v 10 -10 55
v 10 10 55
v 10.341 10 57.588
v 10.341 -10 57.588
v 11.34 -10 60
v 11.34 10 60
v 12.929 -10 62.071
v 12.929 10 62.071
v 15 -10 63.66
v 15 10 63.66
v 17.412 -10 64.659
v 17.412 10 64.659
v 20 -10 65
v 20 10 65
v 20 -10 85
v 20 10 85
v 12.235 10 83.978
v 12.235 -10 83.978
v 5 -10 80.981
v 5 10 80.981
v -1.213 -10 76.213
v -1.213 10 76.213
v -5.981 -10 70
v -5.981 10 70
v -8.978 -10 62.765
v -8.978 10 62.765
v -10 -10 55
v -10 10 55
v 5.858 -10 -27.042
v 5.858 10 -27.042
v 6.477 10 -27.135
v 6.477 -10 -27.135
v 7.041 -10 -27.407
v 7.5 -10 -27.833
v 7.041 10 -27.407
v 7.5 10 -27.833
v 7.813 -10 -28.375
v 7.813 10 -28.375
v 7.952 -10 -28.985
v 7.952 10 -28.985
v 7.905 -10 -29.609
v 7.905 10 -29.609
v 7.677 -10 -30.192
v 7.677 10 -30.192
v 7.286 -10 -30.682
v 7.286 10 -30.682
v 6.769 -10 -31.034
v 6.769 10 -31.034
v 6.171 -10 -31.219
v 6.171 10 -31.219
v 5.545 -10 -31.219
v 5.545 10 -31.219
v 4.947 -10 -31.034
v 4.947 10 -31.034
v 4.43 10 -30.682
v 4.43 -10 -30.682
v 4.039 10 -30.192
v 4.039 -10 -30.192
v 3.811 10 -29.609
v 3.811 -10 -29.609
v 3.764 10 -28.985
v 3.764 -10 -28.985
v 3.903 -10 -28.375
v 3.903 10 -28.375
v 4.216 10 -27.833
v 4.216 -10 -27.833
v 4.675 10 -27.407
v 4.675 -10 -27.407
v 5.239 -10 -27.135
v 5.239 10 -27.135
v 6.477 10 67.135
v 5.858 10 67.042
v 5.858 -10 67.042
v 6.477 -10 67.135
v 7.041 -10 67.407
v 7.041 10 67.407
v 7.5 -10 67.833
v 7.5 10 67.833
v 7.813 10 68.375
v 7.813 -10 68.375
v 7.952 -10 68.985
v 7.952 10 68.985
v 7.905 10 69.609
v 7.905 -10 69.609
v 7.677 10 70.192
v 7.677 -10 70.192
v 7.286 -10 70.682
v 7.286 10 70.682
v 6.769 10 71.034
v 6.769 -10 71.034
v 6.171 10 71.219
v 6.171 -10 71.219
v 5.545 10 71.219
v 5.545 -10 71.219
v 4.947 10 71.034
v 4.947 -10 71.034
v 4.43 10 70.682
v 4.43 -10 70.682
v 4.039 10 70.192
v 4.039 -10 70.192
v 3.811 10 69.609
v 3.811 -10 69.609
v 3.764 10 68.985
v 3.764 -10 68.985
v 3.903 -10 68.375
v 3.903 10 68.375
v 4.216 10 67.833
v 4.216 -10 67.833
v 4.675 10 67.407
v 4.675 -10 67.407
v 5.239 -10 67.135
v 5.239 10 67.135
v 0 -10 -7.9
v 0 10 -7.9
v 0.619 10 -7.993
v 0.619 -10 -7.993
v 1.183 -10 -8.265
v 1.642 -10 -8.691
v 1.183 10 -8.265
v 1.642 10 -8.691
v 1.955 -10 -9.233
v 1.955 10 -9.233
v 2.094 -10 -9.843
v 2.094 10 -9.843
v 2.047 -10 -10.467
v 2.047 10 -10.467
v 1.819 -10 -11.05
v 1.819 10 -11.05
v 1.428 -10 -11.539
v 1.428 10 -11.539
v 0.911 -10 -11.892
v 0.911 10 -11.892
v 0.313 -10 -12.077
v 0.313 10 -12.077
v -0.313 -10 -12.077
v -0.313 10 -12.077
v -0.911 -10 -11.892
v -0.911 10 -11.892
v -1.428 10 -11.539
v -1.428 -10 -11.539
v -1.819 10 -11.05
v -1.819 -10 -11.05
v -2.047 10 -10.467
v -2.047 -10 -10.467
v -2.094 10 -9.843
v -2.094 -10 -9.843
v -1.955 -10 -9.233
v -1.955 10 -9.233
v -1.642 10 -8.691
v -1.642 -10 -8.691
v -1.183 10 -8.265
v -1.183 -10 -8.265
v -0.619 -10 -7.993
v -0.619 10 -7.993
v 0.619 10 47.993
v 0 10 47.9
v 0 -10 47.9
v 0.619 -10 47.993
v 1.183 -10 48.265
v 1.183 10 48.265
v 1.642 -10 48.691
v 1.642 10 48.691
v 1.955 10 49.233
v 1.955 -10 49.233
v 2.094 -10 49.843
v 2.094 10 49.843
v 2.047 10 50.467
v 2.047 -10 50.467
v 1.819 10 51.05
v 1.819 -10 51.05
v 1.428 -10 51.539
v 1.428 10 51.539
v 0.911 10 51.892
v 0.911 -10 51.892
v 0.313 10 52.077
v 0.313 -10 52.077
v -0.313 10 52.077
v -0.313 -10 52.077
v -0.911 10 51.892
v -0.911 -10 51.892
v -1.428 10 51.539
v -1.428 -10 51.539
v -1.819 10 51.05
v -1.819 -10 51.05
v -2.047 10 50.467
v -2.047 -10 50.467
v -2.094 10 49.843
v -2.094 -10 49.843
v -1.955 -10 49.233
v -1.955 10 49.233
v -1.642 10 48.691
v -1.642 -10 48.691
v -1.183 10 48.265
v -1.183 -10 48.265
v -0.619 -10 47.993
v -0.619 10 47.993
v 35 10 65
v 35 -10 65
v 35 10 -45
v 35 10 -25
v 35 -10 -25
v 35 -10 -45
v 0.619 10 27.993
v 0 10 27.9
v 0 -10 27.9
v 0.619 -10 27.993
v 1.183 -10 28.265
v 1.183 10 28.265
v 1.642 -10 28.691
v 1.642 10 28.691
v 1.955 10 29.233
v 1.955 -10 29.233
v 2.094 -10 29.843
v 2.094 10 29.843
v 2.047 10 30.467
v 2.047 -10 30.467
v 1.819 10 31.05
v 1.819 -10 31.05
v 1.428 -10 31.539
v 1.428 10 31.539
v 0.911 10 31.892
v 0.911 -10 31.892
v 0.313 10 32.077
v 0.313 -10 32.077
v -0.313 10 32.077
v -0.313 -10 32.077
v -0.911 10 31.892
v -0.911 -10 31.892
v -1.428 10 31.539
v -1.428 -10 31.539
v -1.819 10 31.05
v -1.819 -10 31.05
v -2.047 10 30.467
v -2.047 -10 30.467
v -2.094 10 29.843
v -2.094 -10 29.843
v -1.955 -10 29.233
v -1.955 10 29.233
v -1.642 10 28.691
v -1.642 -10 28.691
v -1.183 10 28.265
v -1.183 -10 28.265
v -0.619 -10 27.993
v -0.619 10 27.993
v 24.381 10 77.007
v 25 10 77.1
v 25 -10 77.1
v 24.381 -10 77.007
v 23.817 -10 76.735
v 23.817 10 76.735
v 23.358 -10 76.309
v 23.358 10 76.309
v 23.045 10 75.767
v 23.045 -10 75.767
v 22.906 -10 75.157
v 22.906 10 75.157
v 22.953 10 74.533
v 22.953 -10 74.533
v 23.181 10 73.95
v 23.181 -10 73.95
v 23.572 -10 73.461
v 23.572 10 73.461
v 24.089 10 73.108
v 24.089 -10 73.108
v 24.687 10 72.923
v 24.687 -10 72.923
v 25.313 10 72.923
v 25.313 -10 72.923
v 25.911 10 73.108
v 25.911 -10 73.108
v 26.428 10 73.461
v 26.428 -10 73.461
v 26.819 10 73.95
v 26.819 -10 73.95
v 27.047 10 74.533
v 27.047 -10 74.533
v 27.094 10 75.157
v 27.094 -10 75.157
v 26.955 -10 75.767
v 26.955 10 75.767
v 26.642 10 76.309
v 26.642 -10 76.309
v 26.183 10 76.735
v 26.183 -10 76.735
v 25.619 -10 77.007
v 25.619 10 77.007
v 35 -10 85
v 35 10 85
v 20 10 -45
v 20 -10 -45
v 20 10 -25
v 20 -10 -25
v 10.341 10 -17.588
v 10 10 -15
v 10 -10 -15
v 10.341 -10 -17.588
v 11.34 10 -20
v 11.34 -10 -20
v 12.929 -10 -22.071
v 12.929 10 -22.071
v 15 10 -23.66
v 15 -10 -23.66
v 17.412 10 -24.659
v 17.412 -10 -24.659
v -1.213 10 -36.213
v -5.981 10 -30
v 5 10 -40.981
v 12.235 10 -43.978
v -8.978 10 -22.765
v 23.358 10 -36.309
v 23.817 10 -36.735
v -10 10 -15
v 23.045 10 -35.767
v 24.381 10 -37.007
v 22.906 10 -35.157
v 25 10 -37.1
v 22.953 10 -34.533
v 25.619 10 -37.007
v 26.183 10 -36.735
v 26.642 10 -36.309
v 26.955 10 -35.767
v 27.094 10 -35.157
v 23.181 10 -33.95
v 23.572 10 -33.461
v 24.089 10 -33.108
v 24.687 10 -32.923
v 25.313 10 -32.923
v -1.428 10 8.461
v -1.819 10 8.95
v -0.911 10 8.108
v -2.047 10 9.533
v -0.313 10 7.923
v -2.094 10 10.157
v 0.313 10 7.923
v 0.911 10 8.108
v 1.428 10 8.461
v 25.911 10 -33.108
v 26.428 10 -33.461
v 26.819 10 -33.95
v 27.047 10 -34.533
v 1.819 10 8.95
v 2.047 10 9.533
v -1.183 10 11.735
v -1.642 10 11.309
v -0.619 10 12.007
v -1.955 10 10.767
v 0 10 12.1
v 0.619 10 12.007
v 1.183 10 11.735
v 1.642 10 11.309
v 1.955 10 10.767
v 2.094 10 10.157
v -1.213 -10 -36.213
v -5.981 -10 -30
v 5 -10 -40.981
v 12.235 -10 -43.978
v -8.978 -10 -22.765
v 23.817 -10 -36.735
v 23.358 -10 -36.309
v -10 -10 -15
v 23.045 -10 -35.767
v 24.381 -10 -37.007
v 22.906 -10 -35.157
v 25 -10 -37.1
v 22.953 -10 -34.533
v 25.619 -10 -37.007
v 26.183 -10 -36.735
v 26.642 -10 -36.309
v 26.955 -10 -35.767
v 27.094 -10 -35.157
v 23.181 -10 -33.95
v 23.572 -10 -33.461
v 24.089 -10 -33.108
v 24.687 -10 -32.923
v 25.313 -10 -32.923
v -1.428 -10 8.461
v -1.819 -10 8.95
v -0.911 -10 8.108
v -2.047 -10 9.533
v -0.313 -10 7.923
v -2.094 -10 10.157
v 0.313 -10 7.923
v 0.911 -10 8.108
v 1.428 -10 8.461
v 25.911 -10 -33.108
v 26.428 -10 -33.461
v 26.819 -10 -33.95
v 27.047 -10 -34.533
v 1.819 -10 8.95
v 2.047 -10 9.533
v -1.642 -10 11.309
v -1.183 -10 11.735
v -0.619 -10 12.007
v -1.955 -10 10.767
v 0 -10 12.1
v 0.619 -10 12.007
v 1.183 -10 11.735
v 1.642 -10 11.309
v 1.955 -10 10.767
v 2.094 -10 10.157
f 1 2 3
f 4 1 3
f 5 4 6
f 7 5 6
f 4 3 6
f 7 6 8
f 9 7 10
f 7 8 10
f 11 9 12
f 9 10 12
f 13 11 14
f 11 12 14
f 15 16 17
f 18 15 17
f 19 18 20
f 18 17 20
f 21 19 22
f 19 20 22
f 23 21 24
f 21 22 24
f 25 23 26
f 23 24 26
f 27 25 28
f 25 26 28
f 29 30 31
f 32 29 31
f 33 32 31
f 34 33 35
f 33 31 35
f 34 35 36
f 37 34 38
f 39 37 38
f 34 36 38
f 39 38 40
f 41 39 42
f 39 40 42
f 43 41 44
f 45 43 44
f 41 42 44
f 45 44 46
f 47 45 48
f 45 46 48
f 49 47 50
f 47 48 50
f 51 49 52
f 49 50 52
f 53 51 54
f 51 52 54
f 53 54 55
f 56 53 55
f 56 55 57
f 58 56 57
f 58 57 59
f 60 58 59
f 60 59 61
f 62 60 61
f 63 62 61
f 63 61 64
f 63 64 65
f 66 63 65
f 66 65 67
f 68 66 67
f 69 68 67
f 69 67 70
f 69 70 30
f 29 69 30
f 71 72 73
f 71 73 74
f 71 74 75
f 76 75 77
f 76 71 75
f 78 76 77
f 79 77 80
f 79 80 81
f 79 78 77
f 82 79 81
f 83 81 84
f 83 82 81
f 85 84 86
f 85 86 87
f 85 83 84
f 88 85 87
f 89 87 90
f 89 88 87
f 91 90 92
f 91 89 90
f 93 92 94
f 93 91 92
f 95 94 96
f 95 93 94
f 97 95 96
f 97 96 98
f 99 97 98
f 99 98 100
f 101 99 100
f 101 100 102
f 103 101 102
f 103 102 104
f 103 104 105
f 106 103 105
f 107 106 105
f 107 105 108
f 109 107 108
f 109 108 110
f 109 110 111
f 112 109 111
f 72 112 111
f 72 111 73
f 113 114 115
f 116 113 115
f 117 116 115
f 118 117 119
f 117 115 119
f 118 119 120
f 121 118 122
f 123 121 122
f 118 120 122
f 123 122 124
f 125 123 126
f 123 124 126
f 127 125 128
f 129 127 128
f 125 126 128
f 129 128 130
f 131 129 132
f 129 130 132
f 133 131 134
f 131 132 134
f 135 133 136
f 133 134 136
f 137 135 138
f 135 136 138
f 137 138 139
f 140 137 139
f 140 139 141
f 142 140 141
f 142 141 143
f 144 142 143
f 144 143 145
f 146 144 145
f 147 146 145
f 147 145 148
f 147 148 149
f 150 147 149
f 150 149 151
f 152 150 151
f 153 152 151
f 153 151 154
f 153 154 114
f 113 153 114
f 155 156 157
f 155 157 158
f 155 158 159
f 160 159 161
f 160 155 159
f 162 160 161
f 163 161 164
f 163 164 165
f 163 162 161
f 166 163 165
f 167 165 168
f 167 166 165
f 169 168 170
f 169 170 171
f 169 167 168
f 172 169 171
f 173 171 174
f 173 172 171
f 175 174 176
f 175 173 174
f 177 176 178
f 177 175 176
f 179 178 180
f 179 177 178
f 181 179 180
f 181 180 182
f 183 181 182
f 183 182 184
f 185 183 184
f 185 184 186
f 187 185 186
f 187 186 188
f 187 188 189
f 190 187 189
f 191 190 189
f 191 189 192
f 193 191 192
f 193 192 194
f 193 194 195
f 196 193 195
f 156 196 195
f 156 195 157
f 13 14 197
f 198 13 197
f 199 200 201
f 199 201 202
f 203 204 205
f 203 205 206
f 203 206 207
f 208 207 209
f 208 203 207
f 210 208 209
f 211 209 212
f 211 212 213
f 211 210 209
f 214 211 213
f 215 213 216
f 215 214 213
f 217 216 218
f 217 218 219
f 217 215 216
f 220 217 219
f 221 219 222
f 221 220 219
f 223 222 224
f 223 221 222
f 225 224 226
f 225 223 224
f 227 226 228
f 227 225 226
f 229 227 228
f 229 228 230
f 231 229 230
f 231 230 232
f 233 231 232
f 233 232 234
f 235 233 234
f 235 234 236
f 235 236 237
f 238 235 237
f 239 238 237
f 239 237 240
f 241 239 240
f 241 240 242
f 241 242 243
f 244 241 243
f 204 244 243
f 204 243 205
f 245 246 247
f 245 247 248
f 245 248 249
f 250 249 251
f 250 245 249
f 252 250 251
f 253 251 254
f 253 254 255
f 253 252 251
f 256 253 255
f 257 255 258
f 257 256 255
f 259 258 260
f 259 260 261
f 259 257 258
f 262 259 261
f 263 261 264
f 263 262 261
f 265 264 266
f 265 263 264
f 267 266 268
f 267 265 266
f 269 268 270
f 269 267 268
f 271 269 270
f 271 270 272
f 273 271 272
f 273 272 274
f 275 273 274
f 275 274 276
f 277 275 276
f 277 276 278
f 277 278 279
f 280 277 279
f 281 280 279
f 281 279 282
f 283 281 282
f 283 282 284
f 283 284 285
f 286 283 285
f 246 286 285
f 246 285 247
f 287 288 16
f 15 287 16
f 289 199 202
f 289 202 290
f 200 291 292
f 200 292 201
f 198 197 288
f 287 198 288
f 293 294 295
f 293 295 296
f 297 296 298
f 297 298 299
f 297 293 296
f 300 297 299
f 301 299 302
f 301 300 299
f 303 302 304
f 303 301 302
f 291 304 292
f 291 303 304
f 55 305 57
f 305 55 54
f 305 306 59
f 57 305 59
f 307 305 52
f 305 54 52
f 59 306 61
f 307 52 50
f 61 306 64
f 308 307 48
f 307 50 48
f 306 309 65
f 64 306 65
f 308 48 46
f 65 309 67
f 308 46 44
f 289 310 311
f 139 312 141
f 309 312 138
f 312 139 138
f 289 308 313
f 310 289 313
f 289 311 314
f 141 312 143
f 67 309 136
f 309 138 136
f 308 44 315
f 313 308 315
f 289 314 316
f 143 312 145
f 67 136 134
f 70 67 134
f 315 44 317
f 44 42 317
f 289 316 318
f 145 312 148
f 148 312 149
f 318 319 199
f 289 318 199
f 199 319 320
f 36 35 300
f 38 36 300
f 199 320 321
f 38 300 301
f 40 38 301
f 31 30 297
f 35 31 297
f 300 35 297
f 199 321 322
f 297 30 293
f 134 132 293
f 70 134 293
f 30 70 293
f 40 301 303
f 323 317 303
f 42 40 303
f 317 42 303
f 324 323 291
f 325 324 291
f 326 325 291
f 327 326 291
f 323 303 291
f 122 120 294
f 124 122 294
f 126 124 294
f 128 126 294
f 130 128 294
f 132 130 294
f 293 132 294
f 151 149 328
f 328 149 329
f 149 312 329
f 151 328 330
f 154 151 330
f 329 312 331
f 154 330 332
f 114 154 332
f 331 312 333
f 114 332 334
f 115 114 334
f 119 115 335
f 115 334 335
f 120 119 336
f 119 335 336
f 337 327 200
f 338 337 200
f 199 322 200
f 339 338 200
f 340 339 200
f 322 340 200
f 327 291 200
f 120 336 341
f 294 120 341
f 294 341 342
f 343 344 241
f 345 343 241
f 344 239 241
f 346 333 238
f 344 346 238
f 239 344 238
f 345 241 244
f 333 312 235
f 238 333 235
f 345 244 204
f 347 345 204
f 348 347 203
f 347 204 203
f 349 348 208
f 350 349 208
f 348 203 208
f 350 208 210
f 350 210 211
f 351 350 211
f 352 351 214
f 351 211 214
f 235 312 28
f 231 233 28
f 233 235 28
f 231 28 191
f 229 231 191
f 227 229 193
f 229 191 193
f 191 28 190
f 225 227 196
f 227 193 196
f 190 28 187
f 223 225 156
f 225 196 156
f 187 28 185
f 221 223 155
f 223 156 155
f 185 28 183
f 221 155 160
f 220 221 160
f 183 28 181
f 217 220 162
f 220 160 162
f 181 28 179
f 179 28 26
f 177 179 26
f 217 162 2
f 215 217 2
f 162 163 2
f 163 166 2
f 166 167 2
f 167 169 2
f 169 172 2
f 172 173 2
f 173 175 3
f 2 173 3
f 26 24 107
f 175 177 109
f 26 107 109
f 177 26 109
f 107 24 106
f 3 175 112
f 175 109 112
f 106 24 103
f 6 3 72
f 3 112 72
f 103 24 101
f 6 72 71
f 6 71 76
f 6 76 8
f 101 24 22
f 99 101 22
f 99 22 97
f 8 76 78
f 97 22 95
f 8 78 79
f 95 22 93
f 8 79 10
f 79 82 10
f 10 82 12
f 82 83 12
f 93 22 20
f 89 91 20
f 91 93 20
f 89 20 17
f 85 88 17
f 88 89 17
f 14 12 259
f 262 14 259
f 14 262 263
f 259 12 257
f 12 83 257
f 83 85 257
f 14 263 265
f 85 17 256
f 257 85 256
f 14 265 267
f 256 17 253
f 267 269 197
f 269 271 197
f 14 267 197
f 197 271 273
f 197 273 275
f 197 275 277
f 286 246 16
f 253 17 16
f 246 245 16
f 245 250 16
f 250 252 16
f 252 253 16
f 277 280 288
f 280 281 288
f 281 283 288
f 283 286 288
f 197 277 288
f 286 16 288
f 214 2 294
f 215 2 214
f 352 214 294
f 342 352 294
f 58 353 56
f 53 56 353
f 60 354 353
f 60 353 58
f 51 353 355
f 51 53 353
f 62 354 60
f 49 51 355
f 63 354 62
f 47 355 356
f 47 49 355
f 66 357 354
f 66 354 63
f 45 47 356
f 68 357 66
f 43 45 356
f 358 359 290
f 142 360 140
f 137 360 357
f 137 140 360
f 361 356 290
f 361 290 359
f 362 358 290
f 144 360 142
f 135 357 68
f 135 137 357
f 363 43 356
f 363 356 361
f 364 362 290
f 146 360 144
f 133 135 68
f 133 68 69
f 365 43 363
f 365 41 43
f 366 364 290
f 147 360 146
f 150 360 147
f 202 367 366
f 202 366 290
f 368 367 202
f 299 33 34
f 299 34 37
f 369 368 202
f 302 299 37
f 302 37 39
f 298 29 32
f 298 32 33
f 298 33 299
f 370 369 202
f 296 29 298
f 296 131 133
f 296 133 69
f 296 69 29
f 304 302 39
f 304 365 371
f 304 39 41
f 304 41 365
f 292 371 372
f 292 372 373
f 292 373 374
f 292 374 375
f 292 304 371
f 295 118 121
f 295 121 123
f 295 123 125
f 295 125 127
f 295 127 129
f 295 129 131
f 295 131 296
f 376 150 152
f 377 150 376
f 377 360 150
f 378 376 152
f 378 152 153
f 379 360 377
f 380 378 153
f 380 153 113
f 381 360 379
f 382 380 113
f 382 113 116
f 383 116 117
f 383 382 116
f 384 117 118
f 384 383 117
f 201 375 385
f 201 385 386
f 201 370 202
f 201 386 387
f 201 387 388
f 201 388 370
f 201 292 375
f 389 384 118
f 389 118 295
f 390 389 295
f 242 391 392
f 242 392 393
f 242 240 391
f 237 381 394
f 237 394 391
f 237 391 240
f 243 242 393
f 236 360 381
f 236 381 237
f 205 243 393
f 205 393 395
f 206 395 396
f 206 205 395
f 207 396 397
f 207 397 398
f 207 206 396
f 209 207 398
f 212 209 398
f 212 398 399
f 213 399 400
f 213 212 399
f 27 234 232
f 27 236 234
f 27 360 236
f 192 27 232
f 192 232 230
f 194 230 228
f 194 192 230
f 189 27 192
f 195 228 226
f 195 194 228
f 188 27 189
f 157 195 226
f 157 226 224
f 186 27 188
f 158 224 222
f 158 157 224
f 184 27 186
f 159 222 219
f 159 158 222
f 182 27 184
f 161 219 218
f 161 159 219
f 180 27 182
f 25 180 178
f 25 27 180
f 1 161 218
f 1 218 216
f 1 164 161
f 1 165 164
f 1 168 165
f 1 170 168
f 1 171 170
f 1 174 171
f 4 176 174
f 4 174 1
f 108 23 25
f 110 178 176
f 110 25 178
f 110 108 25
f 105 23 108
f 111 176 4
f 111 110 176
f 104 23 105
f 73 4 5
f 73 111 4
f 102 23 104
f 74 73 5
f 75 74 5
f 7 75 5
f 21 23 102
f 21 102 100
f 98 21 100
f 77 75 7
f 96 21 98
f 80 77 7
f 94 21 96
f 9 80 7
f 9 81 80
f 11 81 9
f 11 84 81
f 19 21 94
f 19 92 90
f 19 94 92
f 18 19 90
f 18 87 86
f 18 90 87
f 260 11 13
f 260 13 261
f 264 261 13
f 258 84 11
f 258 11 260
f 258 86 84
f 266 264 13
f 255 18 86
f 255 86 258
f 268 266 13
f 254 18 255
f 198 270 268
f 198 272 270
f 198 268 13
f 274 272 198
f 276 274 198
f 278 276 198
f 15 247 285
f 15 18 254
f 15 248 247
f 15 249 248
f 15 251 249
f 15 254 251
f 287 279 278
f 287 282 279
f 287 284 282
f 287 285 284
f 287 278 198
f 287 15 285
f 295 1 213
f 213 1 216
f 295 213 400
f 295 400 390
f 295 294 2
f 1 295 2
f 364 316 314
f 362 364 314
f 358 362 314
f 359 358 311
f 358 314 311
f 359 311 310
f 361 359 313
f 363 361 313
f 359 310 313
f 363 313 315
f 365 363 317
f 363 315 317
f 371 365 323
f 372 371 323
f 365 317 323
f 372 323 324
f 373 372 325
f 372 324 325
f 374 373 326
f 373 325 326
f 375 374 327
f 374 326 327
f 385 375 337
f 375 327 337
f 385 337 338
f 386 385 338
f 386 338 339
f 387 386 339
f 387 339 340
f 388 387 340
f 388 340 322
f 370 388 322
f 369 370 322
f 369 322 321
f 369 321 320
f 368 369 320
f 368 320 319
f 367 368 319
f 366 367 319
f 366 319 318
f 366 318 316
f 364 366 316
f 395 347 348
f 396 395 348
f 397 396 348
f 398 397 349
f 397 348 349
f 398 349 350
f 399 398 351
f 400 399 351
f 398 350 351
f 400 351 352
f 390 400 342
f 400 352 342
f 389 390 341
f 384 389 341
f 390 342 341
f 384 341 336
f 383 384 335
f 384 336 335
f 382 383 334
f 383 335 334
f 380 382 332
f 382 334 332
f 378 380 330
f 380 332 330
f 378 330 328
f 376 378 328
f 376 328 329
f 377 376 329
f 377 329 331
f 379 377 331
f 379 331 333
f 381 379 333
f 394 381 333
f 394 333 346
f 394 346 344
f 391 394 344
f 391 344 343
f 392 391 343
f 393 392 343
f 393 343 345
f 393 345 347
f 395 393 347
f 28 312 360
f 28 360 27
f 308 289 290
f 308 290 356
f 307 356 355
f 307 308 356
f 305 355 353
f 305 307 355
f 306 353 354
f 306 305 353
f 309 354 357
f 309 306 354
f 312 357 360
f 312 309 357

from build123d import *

# Parameters (mm, degrees)
BOSS_EXTRUDE1_DEPTH = 10
SKETCH3_W           = 20
SKETCH3_H           = 20
BOSS_EXTRUDE2_DEPTH = 20
SKETCH2_R           = 2.1
CUT_EXTRUDE1_DEPTH  = 61.415229868


with BuildPart() as part:
    # Sketch1 → Boss-Extrude1 (new, symmetric)
    with BuildSketch(Plane(origin=(0, 0, 0), x_dir=(1, 0, 0), z_dir=(0, 1, 0))):
        with BuildLine():
            Line((10, 0), (10, 15))
            ThreePointArc((10, 15), (12.928932188, 22.071067812), (20, 25))
            Line((20, 25), (35, 25))
            Line((35, 25), (35, 45))
            Line((35, 45), (20, 45))
            ThreePointArc((20, 45), (-1.213203436, 36.213203436), (-10, 15))
            Line((-10, 15), (-10, 0))
            Line((-10, 0), (10, 0))
        make_face()
    extrude(amount=BOSS_EXTRUDE1_DEPTH, both=True)

    # Sketch3 → Boss-Extrude2 (add)
    with BuildSketch(Plane(origin=(0, 10, 0), x_dir=(1, 0, 0), z_dir=(0, 1, 0))):
        with Locations((0, -10)):
            Rectangle(SKETCH3_W, SKETCH3_H)
    extrude(amount=-BOSS_EXTRUDE2_DEPTH)

    # Sketch2 → Cut-Extrude1 (cut, through all)
    with BuildSketch(Plane(origin=(0, 10, 0), x_dir=(1, 0, 0), z_dir=(0, 1, 0))):
        with Locations(Location((5.857864376, 29.142135624, 0), (0, 0, 270))):
            Circle(SKETCH2_R)
        with Locations(Location((0, 10, 0), (0, 0, 270))):
            Circle(SKETCH2_R)
        with Locations(Location((25, 35, 0), (0, 0, 90))):
            Circle(SKETCH2_R)
        with Locations(Location((0, -10, 0), (0, 0, 270))):
            Circle(SKETCH2_R)
    extrude(amount=-CUT_EXTRUDE1_DEPTH, mode=Mode.SUBTRACT)

    # Mirror1: part across plane


with BuildPart() as part_1:
    add(part.part)
    add(part.part.mirror(Plane(origin=(10, -38.284271247, 20), x_dir=(1, 0, 0), z_dir=(0, 0, 1))))


solid = part_1.part
